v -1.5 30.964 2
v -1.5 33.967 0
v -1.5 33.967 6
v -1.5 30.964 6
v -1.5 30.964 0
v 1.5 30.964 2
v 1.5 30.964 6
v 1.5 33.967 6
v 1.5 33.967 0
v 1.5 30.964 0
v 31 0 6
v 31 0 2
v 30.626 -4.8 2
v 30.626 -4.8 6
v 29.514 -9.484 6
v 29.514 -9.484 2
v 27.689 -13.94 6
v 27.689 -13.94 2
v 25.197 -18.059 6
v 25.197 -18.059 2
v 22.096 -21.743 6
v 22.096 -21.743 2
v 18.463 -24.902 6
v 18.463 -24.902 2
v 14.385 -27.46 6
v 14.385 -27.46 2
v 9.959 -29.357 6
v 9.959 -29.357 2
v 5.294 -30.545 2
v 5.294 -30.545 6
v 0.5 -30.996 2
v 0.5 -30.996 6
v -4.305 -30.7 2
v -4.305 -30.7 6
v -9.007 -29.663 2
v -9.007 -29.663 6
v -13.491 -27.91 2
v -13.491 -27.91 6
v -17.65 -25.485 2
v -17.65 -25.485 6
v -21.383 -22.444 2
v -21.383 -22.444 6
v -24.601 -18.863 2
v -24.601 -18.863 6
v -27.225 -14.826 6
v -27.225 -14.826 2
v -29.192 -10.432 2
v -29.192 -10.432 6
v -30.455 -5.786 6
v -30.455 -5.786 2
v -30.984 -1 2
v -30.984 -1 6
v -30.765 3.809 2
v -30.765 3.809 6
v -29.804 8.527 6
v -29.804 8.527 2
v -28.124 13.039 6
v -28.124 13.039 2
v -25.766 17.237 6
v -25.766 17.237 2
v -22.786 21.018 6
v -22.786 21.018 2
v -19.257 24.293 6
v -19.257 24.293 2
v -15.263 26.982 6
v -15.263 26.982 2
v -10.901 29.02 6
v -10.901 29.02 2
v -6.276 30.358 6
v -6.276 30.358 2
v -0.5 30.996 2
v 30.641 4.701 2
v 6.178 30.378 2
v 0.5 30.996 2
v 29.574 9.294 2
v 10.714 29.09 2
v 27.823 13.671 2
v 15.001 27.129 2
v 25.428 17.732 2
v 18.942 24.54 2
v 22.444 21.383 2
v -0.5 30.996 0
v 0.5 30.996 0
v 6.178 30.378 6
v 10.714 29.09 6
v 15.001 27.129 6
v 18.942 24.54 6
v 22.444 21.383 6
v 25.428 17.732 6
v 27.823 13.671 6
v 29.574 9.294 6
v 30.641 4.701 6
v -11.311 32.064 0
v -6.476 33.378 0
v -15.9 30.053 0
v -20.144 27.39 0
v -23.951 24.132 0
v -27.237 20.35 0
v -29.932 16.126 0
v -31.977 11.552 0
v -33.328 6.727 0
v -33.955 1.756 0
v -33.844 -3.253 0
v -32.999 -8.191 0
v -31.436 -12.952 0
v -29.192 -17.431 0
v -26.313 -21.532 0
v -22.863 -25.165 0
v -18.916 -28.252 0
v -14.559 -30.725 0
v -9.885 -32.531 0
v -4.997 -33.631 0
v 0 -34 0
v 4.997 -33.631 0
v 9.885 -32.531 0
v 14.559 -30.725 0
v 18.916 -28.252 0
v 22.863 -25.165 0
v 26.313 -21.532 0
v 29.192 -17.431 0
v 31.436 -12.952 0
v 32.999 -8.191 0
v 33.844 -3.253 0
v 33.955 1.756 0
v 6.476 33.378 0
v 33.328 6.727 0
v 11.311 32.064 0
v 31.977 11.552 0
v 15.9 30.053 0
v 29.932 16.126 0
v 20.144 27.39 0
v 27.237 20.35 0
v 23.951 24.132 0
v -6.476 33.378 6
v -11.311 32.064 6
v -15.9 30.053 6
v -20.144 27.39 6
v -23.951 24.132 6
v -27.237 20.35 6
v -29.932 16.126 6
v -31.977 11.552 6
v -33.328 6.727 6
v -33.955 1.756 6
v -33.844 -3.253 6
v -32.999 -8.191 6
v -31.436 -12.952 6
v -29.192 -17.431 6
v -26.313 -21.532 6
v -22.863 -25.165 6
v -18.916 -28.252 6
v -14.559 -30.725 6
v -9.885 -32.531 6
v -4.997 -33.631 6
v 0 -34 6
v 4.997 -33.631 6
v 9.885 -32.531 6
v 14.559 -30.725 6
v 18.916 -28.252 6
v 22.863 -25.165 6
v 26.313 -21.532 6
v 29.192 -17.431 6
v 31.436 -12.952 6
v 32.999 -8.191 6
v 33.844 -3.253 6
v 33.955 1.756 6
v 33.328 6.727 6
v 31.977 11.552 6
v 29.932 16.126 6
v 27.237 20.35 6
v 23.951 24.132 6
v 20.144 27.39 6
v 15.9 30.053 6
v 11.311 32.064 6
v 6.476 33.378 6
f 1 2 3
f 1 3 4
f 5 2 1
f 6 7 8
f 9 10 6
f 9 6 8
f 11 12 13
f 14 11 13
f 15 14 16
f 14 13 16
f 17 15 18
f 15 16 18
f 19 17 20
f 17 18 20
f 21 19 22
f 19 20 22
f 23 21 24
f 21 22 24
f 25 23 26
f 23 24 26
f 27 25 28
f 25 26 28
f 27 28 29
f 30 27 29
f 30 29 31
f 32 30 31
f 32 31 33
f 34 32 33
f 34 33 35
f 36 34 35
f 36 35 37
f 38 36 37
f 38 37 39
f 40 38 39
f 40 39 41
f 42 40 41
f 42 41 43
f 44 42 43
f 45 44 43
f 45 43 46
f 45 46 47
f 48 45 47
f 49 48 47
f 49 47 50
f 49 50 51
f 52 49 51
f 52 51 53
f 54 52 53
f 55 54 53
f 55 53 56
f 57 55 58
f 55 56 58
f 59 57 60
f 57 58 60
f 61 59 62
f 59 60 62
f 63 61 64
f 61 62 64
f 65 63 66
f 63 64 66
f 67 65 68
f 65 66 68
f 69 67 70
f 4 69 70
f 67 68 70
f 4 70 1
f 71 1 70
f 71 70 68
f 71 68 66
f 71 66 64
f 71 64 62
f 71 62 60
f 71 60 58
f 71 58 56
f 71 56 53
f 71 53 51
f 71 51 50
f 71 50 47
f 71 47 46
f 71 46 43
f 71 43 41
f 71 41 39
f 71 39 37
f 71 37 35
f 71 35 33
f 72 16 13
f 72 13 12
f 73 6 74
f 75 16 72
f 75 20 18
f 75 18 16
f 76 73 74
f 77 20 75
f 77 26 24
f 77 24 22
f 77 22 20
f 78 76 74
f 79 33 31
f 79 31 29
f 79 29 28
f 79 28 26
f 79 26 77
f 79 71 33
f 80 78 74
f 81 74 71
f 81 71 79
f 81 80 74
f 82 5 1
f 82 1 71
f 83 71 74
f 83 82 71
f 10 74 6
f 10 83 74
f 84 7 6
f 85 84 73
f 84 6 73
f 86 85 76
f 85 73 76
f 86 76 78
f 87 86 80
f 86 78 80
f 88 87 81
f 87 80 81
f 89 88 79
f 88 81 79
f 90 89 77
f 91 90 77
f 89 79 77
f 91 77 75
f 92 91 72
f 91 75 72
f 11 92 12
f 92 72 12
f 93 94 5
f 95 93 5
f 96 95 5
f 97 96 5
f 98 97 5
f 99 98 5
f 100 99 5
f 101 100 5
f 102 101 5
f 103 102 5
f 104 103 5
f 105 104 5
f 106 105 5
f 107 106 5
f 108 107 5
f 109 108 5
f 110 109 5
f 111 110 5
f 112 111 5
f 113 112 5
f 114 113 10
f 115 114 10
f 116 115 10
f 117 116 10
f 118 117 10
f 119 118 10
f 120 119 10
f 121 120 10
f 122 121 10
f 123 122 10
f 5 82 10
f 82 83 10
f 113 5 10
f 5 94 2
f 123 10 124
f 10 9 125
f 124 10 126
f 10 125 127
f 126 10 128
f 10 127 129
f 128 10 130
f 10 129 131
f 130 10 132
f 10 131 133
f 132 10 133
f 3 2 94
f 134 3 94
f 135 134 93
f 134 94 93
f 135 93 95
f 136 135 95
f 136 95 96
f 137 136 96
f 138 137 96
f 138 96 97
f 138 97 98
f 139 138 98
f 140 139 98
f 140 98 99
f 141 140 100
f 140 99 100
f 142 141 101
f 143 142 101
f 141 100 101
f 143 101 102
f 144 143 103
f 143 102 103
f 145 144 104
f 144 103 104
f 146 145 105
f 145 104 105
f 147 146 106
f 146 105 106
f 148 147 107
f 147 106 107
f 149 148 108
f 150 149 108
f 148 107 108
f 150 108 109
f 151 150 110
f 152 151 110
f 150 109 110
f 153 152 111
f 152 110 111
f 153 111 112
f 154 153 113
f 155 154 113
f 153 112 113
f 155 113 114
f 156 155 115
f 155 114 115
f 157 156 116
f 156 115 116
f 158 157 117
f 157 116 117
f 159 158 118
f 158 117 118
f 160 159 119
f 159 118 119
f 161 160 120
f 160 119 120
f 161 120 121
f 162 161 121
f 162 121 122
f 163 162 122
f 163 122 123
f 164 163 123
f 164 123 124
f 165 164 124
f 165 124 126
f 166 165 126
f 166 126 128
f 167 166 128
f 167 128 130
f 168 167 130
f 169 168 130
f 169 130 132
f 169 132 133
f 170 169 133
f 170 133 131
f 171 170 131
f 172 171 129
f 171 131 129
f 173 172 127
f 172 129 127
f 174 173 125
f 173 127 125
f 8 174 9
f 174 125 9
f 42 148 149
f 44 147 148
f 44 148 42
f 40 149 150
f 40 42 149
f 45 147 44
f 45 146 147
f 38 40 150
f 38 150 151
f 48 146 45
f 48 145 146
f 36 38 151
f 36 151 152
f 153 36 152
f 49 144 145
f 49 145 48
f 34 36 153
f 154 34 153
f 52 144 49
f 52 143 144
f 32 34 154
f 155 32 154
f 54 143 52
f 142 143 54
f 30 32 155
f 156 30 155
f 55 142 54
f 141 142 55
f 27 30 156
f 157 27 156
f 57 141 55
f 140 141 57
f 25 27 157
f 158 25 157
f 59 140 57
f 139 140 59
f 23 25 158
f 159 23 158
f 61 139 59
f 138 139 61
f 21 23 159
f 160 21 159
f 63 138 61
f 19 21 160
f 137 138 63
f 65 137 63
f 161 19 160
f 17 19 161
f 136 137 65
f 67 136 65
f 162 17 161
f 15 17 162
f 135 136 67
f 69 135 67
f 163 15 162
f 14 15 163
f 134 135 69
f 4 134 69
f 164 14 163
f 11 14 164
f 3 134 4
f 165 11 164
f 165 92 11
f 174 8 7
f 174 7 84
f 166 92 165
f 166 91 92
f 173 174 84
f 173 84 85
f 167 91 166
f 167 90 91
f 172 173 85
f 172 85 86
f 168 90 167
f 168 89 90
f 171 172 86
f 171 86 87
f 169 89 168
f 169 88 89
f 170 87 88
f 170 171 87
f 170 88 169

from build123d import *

# Parameters (mm, degrees)
F1_DEPTH = 6
F2_DEPTH = 2
F3_DEPTH = 25


with BuildPart() as f1:
    # F0 (on Top) → F1 (new body)
    with BuildSketch(Plane.XY):
        with BuildLine():
            Line((1.5, 30.9636884108), (1.5, 33.9668956486))
            ThreePointArc((1.5, 33.9668956486), (0, 34), (-1.5, 33.9668956486))
            Line((-1.5, 33.9668956486), (-1.5, 30.9636884108))
            ThreePointArc((-1.5, 30.9636884108), (0, 31), (1.5, 30.9636884108))
        make_face()
        with BuildLine():
            ThreePointArc((-1.5, 33.9668956486), (-23.5053185471, -24.5662369931), (34, 0))
            ThreePointArc((34, 0), (24.5662369931, 23.5053185471), (1.5, 33.9668956486))
            Line((1.5, 33.9668956486), (1.5, 30.9636884108))
            ThreePointArc((1.5, 30.9636884108), (22.4443756875, 21.3834047803), (31, 0))
            ThreePointArc((31, 0), (-21.3834047803, -22.4443756875), (-1.5, 30.9636884108))
            Line((-1.5, 30.9636884108), (-1.5, 33.9668956486))
        make_face()
    extrude(amount=F1_DEPTH)

    # F0 (on Top) → F2 (join)
    with BuildSketch(Plane.XY):
        with BuildLine():
            Line((1.5, 25.6097931415), (1.5, 30.9636884108))
            ThreePointArc((1.5, 30.9636884108), (0, 31), (-1.5, 30.9636884108))
            Line((-1.5, 30.9636884108), (-1.5, 25.6097931415))
            Line((-1.5, 25.6097931415), (1.5, 25.6097931415))
        make_face()
        with BuildLine():
            ThreePointArc((31, 0), (22.4443756875, 21.3834047803), (1.5, 30.9636884108))
            Line((1.5, 30.9636884108), (1.5, 25.6097931415))
            Line((1.5, 25.6097931415), (-1.5, 25.6097931415))
            Line((-1.5, 25.6097931415), (-1.5, 30.9636884108))
            ThreePointArc((-1.5, 30.9636884108), (-21.3834047803, -22.4443756875), (31, 0))
        make_face()
    extrude(amount=F2_DEPTH)

    # F0 (on Top) → F3 (cut)
    with BuildSketch(Plane.XY):
        with BuildLine():
            Line((1.5, 30.9636884108), (1.5, 33.9668956486))
            ThreePointArc((1.5, 33.9668956486), (0, 34), (-1.5, 33.9668956486))
            Line((-1.5, 33.9668956486), (-1.5, 30.9636884108))
            ThreePointArc((-1.5, 30.9636884108), (0, 31), (1.5, 30.9636884108))
        make_face()
    extrude(amount=F3_DEPTH, mode=Mode.SUBTRACT)


solid = f1.part
